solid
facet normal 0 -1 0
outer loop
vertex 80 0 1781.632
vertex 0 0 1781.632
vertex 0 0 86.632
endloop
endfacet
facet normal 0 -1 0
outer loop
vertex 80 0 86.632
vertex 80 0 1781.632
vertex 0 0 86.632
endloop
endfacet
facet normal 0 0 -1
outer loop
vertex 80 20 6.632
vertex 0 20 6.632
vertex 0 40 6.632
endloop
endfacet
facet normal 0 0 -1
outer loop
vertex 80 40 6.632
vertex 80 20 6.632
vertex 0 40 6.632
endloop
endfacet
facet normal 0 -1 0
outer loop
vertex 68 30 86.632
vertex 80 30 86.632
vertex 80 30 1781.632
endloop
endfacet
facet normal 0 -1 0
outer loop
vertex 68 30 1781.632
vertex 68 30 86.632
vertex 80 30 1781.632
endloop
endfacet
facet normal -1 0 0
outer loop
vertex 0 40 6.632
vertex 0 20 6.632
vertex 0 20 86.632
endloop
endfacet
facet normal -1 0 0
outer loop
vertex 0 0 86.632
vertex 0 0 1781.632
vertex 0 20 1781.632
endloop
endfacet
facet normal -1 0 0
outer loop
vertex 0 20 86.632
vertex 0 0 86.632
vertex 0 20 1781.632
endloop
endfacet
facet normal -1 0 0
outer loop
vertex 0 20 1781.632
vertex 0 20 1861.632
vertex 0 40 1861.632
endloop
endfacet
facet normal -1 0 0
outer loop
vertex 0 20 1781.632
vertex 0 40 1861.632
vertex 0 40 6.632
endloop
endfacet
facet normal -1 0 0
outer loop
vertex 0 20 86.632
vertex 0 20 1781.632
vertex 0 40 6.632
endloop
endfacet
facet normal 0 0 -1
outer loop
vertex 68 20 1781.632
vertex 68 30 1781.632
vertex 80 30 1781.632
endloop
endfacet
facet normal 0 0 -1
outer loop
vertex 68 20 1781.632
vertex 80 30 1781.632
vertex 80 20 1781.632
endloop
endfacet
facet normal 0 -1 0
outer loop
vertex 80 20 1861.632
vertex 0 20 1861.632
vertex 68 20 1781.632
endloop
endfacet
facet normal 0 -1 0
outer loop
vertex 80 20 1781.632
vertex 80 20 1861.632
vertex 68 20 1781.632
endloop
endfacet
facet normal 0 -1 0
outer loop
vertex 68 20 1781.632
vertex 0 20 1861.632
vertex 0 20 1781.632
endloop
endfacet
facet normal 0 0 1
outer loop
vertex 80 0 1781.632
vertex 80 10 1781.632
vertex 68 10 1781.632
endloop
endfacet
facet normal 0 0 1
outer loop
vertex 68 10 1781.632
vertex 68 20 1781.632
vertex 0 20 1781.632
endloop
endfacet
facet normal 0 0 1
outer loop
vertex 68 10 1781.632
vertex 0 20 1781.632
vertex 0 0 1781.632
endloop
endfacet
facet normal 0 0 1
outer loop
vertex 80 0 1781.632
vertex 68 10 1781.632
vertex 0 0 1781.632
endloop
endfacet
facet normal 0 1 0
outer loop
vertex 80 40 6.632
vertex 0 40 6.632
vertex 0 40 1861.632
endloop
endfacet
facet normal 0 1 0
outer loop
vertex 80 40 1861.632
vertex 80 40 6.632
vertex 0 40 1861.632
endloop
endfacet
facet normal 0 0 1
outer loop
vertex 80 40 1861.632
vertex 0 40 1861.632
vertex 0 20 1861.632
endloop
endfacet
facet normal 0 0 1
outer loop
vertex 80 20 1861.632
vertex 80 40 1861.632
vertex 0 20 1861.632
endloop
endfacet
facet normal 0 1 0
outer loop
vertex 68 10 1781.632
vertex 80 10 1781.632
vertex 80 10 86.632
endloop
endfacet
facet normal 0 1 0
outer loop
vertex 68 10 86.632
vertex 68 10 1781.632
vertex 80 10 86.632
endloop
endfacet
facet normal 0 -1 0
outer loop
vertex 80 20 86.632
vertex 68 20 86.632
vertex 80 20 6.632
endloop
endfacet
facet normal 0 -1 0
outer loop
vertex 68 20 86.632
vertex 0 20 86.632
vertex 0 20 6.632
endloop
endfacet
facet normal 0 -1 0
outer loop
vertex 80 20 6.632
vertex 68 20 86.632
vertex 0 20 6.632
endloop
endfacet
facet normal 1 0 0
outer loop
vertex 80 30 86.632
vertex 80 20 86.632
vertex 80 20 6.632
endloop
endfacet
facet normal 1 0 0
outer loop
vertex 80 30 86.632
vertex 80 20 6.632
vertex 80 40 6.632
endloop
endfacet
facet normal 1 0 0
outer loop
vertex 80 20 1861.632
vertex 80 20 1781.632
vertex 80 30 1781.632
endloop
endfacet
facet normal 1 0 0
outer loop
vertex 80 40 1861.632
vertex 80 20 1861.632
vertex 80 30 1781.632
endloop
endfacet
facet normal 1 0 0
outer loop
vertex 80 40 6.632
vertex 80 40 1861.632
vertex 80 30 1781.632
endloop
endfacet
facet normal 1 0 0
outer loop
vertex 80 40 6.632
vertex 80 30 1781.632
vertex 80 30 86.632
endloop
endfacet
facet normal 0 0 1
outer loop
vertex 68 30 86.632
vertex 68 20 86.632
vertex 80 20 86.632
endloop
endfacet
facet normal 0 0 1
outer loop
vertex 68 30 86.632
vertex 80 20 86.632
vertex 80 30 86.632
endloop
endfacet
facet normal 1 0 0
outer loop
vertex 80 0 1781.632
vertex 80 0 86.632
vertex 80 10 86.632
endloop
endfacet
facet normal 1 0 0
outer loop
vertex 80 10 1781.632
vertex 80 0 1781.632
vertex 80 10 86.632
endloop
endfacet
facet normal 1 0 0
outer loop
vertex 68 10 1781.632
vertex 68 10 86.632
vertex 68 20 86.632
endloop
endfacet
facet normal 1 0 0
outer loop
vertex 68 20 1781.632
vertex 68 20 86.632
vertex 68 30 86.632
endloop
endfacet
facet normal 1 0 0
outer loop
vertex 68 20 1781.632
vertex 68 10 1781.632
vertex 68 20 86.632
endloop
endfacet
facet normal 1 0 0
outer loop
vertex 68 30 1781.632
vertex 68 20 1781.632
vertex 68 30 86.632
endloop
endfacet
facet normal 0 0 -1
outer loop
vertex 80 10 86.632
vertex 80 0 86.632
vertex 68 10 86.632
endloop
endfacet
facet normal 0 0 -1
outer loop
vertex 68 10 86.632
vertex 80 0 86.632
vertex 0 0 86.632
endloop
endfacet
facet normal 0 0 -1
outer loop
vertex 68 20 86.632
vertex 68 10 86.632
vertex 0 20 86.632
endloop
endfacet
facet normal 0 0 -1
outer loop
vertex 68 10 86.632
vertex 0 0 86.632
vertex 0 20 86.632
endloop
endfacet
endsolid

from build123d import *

# Parameters (mm, degrees)
F1_DEPTH = 80
F3_DEPTH = 12


with BuildPart() as f1:
    # F0 (on Right) → F1 (new body)
    with BuildSketch(Plane.YZ):
        Polygon((20, 86.632449), (20, 6.632449), (40, 6.632449), (40, 1861.632449), (20, 1861.632449), (20, 1781.632449), (0, 1781.632449), (0, 86.632449), align=None)
    extrude(amount=F1_DEPTH)

    # F2 (on face) → F3 (cut)
    with BuildSketch(Plane.YZ.offset(80)):
        Polygon((20, 1781.632449), (10, 1781.632449), (10, 86.632449), (20, 86.632449), (30, 86.632449), (30, 1781.632449), align=None)
    extrude(amount=-F3_DEPTH, mode=Mode.SUBTRACT)


solid = f1.part
